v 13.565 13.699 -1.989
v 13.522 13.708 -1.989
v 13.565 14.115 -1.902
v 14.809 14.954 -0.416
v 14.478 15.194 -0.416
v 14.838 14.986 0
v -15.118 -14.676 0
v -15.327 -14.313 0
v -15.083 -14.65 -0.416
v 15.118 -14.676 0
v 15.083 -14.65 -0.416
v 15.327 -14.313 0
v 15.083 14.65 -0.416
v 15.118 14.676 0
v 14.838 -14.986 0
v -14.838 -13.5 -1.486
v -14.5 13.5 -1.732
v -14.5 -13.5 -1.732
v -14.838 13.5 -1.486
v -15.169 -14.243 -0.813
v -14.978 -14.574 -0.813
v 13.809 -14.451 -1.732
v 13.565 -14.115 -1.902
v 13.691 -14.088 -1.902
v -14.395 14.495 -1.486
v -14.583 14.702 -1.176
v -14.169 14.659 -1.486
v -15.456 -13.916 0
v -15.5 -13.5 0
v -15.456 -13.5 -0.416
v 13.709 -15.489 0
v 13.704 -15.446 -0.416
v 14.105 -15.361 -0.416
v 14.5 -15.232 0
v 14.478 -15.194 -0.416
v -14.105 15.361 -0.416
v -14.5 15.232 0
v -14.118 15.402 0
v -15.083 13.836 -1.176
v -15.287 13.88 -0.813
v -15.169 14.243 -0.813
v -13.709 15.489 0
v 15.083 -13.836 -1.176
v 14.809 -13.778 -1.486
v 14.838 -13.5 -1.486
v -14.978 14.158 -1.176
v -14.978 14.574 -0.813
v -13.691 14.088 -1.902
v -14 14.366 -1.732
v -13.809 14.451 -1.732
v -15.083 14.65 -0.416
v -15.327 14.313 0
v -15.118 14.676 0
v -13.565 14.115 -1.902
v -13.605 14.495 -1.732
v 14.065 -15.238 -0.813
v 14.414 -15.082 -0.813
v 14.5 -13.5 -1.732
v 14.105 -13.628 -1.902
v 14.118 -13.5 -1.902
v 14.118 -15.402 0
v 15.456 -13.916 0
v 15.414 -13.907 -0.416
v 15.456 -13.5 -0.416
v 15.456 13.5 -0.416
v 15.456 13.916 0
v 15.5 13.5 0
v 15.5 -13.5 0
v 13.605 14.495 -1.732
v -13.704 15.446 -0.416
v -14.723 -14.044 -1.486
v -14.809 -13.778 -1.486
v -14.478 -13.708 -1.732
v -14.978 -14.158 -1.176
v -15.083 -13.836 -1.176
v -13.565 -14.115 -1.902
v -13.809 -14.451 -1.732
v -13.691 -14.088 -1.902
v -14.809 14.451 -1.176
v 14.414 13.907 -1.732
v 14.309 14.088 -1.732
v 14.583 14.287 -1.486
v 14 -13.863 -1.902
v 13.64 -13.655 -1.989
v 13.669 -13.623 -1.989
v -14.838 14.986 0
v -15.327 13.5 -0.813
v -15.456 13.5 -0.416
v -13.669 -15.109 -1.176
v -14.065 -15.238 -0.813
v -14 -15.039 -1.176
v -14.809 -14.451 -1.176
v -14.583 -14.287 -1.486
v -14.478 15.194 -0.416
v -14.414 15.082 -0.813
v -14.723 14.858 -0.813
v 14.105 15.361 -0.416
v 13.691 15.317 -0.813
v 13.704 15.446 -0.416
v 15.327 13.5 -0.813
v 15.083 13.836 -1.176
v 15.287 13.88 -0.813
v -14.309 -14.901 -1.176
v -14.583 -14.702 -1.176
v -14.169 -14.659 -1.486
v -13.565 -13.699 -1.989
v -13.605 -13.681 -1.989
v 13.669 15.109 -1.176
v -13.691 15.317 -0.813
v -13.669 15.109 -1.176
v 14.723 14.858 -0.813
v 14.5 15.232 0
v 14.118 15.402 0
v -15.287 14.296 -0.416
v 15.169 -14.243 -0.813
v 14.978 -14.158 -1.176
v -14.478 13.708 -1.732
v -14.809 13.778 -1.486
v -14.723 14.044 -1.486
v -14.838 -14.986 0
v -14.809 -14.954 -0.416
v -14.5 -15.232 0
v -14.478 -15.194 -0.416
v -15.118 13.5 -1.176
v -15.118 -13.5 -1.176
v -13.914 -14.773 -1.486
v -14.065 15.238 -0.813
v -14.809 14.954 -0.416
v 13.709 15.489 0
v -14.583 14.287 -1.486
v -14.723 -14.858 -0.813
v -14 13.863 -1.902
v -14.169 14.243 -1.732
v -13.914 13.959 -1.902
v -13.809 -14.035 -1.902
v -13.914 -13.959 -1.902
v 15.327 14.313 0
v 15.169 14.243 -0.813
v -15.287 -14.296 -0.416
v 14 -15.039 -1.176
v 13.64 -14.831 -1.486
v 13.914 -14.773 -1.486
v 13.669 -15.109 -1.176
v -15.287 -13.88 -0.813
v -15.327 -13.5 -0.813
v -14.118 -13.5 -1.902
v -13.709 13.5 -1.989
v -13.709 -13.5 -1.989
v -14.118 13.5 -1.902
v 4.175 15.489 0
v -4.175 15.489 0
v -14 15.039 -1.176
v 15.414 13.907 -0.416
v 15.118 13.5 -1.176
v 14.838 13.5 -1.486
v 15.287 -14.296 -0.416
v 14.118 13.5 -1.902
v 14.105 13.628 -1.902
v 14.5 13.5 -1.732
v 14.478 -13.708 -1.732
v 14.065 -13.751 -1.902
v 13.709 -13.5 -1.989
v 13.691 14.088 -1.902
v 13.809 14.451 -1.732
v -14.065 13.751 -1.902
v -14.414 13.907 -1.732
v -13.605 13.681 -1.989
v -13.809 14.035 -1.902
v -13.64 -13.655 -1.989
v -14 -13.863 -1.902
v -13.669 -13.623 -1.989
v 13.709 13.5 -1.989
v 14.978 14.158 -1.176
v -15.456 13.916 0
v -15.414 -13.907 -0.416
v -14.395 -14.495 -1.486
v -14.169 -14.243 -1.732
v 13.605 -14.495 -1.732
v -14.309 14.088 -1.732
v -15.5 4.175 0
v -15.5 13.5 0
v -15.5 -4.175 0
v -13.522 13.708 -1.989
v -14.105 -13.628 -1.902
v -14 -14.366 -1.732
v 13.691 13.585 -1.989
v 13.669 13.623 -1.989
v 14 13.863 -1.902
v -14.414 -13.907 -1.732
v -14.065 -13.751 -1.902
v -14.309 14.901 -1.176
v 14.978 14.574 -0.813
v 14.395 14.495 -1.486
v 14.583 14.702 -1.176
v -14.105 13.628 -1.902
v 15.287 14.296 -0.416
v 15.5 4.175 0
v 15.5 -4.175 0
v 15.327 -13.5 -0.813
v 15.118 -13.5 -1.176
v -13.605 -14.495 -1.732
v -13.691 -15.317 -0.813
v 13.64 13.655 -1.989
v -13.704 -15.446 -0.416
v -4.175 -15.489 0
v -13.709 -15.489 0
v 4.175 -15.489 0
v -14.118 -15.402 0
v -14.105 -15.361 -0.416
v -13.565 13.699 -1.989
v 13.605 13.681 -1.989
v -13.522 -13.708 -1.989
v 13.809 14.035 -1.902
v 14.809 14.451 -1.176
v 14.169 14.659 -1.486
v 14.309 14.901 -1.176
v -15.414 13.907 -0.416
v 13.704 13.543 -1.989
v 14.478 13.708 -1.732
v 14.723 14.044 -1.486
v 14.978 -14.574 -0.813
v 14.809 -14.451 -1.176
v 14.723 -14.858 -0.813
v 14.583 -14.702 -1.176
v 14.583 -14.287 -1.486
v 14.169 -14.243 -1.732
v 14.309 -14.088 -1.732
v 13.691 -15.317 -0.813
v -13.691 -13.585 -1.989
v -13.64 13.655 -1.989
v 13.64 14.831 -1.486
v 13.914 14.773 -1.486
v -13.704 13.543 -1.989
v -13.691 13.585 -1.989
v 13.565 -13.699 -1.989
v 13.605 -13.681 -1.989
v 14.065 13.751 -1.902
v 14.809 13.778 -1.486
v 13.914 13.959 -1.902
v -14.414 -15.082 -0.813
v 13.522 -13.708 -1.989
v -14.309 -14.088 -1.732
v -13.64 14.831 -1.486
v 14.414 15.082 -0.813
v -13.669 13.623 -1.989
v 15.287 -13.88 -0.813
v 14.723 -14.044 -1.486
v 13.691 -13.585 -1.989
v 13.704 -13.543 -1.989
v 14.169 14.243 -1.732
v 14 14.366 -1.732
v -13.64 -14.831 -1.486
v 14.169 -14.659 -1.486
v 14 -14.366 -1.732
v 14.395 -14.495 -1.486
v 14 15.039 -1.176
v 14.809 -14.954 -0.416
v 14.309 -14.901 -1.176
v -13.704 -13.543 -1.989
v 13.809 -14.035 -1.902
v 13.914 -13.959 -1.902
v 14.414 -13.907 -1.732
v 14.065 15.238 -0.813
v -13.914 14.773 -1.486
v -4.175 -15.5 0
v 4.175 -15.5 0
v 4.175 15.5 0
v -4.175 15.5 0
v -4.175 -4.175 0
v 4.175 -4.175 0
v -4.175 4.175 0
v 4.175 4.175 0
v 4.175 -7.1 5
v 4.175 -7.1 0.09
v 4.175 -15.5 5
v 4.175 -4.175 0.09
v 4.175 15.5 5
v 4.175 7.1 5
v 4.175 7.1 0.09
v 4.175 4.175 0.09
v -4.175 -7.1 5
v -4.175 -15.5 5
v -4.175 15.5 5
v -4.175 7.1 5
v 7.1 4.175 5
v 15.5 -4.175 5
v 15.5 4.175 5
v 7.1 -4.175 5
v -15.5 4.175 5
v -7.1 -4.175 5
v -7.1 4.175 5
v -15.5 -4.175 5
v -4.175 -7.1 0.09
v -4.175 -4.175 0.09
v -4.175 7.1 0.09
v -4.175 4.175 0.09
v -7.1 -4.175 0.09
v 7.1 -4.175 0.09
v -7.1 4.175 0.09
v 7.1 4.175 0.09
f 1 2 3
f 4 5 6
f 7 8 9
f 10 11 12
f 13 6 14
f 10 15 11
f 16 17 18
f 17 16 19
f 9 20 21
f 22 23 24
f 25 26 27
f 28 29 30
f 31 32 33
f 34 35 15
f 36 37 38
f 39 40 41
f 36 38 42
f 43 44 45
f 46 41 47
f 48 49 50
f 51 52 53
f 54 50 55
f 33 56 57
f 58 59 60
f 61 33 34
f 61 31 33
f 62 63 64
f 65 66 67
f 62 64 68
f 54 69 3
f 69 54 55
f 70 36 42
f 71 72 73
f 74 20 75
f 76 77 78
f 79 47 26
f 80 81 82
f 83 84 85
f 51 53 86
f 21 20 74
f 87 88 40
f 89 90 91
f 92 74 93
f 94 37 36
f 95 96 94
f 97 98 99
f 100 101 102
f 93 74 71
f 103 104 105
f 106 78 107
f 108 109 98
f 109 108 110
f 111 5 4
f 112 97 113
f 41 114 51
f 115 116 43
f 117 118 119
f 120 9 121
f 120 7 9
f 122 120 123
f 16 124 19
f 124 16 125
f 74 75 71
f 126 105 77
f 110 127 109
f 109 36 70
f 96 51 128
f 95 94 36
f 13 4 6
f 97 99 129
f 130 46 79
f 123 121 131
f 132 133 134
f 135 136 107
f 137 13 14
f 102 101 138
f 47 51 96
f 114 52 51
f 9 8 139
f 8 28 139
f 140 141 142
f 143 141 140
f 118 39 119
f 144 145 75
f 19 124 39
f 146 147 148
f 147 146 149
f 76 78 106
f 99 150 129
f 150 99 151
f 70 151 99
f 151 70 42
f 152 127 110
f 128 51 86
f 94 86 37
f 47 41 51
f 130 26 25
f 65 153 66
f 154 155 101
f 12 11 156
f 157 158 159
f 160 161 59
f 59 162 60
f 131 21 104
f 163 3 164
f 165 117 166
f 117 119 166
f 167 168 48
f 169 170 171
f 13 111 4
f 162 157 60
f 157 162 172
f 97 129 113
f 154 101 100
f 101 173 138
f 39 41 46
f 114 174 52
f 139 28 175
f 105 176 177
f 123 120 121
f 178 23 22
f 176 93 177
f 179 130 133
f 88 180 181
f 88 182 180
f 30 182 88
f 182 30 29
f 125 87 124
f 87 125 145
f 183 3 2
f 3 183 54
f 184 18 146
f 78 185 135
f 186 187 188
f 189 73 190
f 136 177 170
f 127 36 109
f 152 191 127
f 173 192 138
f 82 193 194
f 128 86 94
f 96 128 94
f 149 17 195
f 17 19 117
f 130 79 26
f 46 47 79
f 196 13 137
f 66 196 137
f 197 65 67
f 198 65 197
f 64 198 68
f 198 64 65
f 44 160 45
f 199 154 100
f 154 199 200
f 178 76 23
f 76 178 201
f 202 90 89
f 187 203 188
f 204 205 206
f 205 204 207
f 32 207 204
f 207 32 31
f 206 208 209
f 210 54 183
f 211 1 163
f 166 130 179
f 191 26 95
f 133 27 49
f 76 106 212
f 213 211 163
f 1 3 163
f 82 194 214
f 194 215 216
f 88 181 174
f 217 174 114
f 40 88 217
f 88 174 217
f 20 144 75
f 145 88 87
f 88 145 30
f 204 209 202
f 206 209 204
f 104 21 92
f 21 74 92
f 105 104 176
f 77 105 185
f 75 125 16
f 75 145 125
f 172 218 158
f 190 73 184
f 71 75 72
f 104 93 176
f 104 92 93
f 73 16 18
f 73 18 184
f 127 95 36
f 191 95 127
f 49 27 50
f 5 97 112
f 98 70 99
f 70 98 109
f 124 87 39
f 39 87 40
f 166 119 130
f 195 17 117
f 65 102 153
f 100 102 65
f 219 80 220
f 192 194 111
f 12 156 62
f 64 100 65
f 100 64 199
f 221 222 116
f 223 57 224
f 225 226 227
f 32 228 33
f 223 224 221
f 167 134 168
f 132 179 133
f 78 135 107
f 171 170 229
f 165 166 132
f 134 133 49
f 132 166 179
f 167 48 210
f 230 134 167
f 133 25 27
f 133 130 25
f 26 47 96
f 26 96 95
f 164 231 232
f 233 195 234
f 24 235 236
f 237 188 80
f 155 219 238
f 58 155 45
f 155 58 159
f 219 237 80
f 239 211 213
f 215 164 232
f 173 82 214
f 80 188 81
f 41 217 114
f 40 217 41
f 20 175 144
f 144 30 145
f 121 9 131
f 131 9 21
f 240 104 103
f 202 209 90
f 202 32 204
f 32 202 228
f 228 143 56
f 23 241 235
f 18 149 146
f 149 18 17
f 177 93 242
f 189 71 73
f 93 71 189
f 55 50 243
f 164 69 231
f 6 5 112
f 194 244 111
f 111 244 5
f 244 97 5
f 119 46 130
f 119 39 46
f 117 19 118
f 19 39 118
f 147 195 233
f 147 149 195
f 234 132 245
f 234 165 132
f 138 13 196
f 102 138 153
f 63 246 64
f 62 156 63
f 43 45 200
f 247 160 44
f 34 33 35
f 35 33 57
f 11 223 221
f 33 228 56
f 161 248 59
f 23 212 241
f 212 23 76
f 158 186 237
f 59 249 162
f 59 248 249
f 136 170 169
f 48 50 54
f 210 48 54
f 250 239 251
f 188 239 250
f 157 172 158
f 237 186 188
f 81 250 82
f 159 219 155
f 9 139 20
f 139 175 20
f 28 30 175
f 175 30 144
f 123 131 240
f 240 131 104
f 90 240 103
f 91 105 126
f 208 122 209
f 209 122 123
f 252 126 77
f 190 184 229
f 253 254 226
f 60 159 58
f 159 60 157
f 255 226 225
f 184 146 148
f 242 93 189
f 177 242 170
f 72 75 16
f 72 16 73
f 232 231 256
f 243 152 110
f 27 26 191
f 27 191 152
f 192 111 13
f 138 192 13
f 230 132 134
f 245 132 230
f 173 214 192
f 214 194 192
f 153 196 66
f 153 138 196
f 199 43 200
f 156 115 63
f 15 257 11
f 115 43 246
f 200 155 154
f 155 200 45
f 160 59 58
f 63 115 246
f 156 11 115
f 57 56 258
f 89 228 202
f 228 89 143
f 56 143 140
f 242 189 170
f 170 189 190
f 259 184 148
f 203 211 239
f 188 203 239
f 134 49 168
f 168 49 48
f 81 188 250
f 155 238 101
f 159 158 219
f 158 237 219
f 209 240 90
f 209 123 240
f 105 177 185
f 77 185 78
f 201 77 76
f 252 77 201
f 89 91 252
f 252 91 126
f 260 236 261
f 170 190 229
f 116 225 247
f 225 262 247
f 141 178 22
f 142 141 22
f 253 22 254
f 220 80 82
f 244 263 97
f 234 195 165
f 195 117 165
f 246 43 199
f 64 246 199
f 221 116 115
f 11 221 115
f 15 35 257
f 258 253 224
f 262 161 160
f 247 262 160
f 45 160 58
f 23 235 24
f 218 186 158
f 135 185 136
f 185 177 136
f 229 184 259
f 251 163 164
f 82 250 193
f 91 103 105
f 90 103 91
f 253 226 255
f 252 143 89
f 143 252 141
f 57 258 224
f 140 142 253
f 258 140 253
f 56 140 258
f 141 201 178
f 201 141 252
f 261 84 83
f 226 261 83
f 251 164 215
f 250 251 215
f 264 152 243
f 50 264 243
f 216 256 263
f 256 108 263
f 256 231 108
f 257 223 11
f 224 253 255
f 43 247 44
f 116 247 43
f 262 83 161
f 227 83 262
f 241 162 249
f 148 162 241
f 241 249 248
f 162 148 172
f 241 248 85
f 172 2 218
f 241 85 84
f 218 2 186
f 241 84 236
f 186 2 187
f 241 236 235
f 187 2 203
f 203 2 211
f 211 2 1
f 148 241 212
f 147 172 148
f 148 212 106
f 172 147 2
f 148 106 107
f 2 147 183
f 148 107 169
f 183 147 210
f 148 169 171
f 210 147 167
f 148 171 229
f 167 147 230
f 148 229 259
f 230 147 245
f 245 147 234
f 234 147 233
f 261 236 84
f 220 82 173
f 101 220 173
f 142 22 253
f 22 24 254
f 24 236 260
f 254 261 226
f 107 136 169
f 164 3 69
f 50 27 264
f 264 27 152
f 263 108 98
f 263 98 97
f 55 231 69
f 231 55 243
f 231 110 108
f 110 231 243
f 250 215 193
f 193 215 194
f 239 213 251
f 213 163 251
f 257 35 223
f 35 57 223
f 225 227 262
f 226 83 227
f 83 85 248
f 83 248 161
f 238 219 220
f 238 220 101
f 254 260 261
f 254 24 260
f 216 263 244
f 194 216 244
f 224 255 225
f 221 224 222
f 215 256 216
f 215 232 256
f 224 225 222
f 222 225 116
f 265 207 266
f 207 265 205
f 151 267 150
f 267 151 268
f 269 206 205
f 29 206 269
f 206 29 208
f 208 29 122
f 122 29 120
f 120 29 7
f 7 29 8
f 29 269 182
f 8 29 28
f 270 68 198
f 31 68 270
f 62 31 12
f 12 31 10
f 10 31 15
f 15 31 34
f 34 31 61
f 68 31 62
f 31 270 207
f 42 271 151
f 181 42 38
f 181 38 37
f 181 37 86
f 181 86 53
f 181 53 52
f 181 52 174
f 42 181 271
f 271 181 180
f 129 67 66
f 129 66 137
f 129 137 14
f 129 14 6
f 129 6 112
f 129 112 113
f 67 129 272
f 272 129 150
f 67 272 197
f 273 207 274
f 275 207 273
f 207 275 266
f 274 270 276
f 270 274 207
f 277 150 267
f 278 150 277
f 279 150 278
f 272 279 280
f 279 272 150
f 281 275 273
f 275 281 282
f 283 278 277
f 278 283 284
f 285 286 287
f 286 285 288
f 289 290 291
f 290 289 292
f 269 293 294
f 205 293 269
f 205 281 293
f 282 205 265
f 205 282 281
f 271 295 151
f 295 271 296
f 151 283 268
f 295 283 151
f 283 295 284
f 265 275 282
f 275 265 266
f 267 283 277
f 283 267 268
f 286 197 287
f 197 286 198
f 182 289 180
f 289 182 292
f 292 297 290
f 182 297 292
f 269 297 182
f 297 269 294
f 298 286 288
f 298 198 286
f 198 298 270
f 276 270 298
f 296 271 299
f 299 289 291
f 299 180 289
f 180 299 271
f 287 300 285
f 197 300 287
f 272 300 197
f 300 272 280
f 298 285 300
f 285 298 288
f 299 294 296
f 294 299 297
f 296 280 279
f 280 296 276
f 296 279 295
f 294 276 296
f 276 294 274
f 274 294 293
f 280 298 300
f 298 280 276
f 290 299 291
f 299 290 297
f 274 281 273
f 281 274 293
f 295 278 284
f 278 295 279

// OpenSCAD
$fn=30;
h=5;
prof=31;
r=2;
noches=8.35;

module ALU_profile_cap() {
    rotate([180,0,0]){
        difference(){
            spheres(r=r);
            translate([0,0,-h]) outerCube(h=h);
        }
    
        translate([0,0,-h]) difference(){
            notches(h=h);
            innerCube(h=h+0.01);
        }
    }
}

module outerCube(h=10){
	translate([0,0,h/2]) cube([prof,prof,h], true);
}

module innerCube(h=10){
	translate([0,0,h/2-.6]) cube([14.2,14.2,h+1], true);
}

module notches(h=10){
	translate([0,0,h/2]) cube([noches,prof,h], true);
	translate([0,0,h/2]) cube([prof,noches,h], true);
}

module spheres(r=3){
	x=prof/2-r;
	hull(){
		translate([x,x,0]) sphere(r=r);
		translate([x,-x,0]) sphere(r=r);
		translate([-x,x,0]) sphere(r=r);
		translate([-x,-x,0]) sphere(r=r);
	}
}

ALU_profile_cap();
